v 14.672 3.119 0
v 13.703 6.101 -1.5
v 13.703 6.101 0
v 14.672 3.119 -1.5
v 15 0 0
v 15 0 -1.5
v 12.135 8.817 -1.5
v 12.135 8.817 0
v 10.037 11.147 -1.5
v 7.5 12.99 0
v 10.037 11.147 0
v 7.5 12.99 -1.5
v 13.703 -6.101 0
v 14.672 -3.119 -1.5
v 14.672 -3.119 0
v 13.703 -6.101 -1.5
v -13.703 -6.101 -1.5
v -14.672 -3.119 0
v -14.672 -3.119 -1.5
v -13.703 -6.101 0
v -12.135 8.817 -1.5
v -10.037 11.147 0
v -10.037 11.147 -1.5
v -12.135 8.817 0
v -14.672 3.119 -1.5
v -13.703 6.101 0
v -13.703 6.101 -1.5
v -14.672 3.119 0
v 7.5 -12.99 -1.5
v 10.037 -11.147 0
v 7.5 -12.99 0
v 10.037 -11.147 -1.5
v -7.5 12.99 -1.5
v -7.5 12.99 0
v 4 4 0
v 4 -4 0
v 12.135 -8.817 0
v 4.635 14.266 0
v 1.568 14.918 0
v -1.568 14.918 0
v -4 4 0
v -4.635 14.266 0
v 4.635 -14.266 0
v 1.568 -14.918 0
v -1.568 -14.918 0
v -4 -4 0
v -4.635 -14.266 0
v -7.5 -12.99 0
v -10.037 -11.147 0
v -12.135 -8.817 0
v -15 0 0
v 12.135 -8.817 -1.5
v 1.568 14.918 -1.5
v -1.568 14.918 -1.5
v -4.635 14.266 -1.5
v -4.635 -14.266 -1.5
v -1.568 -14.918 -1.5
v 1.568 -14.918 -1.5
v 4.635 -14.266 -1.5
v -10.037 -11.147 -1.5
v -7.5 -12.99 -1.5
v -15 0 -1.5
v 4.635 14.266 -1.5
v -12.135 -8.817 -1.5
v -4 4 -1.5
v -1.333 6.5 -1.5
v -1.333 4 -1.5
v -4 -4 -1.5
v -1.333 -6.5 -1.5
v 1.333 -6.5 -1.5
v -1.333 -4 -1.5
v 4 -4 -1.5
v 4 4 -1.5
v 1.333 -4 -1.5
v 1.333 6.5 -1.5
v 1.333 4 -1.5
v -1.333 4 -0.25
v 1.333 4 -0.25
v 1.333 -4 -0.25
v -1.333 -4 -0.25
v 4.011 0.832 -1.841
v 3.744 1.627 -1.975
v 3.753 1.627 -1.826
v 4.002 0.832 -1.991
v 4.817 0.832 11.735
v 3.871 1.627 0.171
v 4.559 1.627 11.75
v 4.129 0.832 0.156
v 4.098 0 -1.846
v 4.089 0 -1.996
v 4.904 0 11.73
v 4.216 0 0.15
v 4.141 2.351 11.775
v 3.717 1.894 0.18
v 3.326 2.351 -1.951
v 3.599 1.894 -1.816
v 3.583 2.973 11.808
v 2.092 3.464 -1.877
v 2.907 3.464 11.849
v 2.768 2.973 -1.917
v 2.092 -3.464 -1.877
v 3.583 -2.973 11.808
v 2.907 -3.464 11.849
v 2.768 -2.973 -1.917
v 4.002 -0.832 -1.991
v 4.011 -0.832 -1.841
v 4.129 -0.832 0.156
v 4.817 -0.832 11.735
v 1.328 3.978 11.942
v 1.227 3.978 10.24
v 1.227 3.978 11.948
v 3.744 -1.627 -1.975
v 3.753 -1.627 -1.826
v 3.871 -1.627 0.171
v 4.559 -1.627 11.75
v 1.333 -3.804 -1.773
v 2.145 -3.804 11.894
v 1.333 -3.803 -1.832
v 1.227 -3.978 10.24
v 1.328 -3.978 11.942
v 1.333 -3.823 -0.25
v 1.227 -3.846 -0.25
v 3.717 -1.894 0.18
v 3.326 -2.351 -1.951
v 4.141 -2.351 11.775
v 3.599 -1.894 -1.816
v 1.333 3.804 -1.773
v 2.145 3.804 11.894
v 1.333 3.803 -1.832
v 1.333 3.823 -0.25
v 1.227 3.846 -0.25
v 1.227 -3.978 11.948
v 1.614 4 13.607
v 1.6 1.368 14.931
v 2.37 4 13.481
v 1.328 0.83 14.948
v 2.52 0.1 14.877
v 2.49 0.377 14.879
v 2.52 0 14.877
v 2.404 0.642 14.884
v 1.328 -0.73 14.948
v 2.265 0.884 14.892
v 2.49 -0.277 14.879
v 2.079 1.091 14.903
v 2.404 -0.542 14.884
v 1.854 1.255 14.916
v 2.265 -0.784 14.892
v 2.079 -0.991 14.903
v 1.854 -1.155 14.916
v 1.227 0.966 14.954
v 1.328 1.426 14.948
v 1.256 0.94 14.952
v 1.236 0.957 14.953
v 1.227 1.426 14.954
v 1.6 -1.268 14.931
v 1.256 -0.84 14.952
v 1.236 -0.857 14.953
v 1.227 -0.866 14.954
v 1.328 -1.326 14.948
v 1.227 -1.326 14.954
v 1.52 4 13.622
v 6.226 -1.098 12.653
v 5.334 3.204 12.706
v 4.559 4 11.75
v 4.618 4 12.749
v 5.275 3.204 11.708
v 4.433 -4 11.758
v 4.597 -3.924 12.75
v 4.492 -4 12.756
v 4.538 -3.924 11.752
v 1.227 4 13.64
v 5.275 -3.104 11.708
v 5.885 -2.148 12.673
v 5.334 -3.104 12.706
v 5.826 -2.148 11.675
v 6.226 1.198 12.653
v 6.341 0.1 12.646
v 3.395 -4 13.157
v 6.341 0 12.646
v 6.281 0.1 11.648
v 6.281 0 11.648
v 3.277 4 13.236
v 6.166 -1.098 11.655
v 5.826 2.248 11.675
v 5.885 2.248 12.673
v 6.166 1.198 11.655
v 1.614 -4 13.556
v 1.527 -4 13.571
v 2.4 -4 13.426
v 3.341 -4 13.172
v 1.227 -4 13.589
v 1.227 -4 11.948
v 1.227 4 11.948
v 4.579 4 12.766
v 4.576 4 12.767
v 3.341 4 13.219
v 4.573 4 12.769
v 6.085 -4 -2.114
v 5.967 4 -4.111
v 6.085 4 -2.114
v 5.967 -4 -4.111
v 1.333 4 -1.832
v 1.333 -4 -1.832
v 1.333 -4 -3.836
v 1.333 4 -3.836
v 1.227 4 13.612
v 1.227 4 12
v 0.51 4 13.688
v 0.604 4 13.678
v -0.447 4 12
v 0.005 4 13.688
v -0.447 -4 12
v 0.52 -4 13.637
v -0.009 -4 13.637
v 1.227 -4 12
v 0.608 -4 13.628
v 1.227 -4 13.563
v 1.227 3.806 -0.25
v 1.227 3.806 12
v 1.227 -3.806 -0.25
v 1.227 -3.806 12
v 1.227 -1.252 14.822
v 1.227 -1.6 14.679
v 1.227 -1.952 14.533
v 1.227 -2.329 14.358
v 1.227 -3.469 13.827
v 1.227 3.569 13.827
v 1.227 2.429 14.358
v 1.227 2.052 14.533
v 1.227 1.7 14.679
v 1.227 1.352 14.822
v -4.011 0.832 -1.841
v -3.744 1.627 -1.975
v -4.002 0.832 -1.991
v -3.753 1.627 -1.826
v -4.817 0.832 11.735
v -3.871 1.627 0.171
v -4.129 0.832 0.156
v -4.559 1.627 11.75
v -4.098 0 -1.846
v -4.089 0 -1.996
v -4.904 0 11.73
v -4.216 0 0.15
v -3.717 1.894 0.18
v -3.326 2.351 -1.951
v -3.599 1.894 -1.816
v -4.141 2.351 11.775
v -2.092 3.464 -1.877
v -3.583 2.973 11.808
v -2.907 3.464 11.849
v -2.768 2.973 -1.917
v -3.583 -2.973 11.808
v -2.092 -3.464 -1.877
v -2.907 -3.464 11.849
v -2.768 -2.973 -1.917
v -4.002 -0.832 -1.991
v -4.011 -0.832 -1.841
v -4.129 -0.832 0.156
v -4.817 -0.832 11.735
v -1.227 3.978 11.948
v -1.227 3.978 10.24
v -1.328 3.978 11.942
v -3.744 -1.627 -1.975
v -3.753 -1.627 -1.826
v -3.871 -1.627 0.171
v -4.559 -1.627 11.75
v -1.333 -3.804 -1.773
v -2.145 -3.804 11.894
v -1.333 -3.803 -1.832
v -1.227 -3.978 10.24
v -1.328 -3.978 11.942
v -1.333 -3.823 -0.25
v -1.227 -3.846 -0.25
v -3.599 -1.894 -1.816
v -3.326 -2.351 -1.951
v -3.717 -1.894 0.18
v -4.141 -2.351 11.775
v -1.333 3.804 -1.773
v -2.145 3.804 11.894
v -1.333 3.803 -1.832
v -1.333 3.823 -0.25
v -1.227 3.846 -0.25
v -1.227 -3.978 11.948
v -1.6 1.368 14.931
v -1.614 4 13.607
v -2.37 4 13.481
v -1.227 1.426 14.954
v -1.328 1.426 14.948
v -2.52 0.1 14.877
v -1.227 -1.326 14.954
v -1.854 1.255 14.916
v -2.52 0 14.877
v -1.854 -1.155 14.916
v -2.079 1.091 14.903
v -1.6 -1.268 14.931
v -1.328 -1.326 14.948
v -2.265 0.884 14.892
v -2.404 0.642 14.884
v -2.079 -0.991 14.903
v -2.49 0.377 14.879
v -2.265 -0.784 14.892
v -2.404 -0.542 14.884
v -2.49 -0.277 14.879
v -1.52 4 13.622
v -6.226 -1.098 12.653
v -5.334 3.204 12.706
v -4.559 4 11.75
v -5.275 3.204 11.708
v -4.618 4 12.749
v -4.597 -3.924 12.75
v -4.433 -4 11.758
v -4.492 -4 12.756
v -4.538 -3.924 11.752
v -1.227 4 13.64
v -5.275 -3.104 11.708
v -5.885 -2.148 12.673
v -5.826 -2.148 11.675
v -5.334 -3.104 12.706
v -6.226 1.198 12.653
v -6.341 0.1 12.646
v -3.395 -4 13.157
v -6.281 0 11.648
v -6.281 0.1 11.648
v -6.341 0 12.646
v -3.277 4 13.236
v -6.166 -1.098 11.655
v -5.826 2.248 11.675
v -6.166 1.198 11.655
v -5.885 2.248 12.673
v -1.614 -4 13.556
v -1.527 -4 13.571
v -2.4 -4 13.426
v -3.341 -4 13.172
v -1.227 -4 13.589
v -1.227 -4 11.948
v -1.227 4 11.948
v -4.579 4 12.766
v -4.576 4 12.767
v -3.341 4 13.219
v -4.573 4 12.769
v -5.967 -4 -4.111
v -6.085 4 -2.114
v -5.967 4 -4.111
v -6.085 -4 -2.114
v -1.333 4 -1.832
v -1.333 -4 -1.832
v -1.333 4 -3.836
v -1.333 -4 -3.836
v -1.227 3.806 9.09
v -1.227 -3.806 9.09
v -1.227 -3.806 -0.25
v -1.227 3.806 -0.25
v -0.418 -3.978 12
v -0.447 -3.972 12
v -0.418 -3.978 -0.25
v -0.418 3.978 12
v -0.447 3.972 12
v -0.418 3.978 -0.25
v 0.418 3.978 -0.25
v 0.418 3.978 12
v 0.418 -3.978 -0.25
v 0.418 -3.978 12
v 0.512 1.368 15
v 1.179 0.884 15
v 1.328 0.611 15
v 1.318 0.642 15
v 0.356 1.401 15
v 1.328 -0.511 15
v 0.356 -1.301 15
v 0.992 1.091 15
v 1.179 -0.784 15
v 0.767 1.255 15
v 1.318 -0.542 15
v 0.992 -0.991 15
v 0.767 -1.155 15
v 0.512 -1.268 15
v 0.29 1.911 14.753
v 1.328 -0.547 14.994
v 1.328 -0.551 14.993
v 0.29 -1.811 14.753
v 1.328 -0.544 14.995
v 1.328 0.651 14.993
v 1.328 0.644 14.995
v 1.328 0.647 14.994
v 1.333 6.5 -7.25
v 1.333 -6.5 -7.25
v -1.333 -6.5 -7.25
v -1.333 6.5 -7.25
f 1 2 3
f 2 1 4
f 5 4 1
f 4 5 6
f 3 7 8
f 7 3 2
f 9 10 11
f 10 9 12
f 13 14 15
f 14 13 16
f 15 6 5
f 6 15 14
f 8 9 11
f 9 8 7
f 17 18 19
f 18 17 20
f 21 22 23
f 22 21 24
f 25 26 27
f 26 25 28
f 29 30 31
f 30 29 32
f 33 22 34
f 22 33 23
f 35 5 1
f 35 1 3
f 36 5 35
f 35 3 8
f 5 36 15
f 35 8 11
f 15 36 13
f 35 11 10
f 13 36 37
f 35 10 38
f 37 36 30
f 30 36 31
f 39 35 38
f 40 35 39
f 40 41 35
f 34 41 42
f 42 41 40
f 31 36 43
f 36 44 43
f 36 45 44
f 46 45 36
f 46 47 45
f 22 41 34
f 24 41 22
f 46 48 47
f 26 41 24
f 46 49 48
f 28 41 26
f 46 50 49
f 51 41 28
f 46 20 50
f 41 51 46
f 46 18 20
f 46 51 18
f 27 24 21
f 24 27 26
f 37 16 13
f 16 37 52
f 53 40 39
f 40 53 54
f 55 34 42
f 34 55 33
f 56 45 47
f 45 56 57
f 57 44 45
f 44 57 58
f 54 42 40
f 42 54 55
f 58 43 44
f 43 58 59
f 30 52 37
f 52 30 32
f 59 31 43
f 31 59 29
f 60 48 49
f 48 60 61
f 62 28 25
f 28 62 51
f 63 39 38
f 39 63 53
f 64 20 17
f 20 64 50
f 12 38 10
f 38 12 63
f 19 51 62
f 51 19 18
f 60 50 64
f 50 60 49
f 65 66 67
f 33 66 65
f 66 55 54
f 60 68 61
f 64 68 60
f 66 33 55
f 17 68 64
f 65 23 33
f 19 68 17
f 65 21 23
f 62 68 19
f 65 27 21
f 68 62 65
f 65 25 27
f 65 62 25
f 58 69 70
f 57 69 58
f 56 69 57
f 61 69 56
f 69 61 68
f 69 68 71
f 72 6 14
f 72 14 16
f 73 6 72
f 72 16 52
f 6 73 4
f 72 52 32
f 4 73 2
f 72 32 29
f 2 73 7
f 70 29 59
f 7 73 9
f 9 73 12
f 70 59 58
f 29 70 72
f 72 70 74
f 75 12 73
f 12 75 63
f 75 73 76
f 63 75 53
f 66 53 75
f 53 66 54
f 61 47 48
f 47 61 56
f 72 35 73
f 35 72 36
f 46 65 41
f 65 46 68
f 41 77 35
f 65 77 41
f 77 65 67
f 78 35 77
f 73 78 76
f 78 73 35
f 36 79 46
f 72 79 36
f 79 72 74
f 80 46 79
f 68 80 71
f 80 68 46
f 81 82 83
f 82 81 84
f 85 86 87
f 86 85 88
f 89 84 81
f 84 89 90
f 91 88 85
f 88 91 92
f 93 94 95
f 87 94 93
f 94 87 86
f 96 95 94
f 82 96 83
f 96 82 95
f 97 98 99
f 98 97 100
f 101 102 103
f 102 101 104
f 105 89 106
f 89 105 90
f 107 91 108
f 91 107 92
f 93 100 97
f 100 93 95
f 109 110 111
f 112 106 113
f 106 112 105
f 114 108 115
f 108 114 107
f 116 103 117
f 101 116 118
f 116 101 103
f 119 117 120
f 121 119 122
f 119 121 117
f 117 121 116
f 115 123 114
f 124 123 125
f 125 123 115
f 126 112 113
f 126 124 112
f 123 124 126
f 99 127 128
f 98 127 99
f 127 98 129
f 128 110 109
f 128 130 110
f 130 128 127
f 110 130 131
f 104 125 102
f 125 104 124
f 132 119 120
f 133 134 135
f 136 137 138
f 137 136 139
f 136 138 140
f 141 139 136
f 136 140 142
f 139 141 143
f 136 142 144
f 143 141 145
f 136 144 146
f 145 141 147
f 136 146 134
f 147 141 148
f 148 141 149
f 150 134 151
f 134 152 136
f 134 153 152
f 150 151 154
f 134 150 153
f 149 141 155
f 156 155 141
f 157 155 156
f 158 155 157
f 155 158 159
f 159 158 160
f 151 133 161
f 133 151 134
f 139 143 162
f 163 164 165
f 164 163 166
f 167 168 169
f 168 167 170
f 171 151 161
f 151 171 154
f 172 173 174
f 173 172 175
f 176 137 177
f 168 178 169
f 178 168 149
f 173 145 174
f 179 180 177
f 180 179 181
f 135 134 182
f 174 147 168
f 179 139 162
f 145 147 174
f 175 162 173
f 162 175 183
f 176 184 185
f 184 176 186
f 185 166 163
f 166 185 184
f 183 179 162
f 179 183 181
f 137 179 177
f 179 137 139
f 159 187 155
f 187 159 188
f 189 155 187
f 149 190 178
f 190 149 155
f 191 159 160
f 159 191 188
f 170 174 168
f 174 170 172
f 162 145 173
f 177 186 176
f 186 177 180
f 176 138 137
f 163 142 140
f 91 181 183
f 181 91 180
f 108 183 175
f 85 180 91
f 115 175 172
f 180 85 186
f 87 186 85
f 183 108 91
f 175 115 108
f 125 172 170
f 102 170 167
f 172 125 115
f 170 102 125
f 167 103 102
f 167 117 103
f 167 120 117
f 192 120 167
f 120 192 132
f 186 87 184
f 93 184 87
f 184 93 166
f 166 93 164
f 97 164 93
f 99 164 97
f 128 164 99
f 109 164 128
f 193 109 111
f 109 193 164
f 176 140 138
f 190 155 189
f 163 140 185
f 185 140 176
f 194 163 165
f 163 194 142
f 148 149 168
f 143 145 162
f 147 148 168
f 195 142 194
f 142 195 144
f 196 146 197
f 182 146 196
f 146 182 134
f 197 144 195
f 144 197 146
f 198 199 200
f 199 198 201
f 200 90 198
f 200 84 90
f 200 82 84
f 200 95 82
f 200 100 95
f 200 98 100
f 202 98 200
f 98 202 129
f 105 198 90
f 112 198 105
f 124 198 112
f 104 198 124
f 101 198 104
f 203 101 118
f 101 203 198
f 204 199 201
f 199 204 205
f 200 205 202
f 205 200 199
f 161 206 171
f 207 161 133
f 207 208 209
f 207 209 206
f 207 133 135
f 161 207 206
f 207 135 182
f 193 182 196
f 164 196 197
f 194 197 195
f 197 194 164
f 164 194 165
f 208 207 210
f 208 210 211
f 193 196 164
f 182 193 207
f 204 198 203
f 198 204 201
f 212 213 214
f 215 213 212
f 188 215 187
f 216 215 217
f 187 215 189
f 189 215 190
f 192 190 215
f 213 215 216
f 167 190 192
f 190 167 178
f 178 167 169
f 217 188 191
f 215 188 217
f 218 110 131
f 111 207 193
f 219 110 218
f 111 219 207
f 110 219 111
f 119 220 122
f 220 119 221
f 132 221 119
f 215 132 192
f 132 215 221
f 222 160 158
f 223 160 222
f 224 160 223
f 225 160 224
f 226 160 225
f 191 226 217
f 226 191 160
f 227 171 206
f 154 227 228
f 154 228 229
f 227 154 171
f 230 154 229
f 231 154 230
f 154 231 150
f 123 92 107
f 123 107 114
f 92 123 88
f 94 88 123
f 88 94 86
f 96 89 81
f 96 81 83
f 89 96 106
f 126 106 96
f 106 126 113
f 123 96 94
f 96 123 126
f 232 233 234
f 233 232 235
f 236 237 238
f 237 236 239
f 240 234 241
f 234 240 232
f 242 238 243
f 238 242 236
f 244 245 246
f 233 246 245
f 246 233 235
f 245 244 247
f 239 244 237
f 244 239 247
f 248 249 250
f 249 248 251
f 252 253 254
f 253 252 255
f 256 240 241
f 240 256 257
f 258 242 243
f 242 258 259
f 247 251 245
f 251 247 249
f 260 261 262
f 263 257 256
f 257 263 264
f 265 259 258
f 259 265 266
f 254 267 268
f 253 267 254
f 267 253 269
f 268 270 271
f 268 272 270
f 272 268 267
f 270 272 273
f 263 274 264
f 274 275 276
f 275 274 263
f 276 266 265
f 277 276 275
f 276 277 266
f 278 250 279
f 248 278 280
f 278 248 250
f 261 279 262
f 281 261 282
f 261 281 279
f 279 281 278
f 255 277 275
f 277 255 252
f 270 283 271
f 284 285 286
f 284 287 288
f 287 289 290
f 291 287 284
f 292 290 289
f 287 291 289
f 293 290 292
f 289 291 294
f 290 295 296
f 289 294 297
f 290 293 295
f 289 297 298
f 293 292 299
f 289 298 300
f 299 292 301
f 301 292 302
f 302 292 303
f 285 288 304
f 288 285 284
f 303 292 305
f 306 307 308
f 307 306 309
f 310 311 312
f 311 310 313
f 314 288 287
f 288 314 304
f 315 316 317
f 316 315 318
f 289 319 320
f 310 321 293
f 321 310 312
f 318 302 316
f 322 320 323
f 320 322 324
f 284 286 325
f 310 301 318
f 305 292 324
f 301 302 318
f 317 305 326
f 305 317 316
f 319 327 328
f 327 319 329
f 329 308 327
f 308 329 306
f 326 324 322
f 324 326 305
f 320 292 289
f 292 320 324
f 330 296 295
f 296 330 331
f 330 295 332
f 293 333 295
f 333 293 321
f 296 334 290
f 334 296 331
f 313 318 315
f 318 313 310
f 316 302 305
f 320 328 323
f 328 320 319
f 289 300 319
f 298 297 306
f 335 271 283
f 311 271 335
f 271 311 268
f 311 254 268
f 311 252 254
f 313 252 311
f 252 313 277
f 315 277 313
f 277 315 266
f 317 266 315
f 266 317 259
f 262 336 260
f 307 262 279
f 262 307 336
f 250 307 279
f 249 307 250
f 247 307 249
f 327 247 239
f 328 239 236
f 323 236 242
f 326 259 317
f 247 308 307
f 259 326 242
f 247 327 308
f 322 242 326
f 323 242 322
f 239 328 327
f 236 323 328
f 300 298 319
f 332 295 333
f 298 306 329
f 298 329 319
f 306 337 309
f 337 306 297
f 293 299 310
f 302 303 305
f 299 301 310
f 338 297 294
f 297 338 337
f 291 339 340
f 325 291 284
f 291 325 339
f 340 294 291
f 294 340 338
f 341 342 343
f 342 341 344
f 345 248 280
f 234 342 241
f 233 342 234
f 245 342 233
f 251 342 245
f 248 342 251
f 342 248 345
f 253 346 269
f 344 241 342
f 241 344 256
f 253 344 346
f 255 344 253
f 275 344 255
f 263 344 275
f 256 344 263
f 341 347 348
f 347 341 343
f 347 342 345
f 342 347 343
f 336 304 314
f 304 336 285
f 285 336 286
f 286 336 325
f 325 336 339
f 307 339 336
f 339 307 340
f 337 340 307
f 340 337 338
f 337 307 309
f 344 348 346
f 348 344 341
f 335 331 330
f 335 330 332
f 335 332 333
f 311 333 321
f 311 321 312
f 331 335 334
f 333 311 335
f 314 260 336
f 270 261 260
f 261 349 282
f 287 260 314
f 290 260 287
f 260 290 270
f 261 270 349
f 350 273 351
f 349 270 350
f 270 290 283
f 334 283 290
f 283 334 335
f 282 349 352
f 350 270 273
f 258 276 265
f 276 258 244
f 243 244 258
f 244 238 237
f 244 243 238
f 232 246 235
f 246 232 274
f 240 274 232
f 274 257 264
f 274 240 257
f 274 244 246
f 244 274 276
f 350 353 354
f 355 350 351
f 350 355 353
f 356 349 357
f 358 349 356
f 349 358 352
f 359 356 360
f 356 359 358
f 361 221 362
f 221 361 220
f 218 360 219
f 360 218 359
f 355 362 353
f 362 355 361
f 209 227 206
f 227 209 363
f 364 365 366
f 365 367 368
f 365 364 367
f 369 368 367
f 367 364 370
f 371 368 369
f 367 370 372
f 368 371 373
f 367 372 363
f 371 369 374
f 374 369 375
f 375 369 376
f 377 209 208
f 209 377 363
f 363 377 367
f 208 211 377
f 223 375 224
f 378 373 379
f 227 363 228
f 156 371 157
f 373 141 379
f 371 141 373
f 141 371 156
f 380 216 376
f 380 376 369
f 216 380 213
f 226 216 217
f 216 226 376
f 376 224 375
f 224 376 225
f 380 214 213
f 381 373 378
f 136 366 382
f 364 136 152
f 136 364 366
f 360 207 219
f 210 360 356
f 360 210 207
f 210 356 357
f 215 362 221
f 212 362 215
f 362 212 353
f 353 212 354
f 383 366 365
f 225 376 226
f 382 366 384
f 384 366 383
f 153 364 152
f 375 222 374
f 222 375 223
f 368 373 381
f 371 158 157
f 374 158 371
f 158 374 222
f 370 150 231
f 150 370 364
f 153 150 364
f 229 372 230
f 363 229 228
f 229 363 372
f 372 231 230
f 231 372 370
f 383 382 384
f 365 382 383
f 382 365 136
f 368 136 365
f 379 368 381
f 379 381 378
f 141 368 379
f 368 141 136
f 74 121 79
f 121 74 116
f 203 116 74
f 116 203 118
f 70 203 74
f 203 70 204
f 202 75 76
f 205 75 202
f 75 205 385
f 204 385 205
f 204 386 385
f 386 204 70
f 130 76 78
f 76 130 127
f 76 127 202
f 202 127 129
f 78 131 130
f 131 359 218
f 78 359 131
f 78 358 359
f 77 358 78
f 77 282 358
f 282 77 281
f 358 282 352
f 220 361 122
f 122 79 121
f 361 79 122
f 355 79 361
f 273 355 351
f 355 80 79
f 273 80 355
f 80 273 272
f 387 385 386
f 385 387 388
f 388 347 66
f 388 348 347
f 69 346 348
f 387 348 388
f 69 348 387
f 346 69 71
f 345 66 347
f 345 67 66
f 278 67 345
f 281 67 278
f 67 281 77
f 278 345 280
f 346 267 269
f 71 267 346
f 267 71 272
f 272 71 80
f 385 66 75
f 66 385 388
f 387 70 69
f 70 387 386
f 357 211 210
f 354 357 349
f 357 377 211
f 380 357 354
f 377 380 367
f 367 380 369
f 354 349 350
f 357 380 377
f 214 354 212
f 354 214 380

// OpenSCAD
/* [Panel_Retainer_Clip] */
//Diameter of center pin in mm
PinDiameterInMm = 8;// [6:15]
//Length of center pin in mm.
PinLengthInMm = 12;//[7:50]
//Diamenter of the large washer
WasherDiameterInMm = 30;//[20:50]
/* [Print_Layout] */
// 0 to render as assembled, 1 to render for printing
$PrintLayout = 0;//[0:Assembled,1:Printable]

/* [Hidden] */
$fs=.8;


if ($PrintLayout == 0)
    PanelRetainerClip(PinDiameterInMm,WasherDiameterInMm,PinLengthInMm, true);
else 
    PrintLayout(PinDiameterInMm,WasherDiameterInMm,PinLengthInMm);

module PrintLayout(shaftDiameter, topDiameter, depth){
    angle = atan(.95/(depth+4));
    translate([-topDiameter/2,(shaftDiameter-topDiameter)/2+2,1.5])
        TopWasher(shaftDiameter, topDiameter);
    translate([depth+3.5,-1,0.1])
        rotate([0,-90+angle,0])
            translate([-shaftDiameter/6,0,0])
                RightWing(shaftDiameter, depth);
    translate([-depth-4,shaftDiameter+3,0.1])
        rotate([0,90-angle,0])
            translate([shaftDiameter/6,0,0])
                LeftWing(shaftDiameter,depth);
    translate([8, shaftDiameter+3,0])
        rotate([0,90,0])
            translate([-shaftDiameter/6,0,0])
                Pin(shaftDiameter,depth);
}

module PanelRetainerClip(shaftDiameter=6, topDiameter=25, depth=15, open=false){
    angle = atan(.95/(depth+4));
    color("gray")
        TopWasher(shaftDiameter, topDiameter);
    color("darkgray")
    rotate([0,open?angle:0,0])
        RightWing(shaftDiameter, depth);
    color("steelblue")
    rotate([0,open?-angle:0,0])
        LeftWing(shaftDiameter, depth);
    color("navy")
    translate([0,0,open==true?0:-depth-4])
        Pin(shaftDiameter, depth);
}

module TopWasher(shaftDiameter, topDiameter){
    translate([0,0,-.75])
    difference(){
        cylinder(d=topDiameter, h = 1.5, center=true);
        cube([shaftDiameter, shaftDiameter, 2], center=true);
    }
}
module CenterSlot(shaftDiameter, depth){
    cube([shaftDiameter/3-.01,2*shaftDiameter, 4*depth], center = true);
}
module IdealPin(shaftDiameter, depth){
    intersection(){
        union(){
            translate([0,0,depth/2-.75])
                cylinder(d=shaftDiameter, h = depth+3, center=true);
            translate([0,0,depth])
                minkowski(){
                    cylinder(r1=shaftDiameter*.66, r2 = shaftDiameter/6, h=2);
                    cube([.1,.1,1]);
                }
                
            translate([0,0,-2.75])
                cube([shaftDiameter+4,shaftDiameter, 2], center=true);
        }
        cube([2*shaftDiameter, shaftDiameter, depth*3], center=true);
    }
}
module Half(shaftDiameter, depth){
    translate([-shaftDiameter, -shaftDiameter,-depth])
        cube([shaftDiameter, 2*shaftDiameter, 3*depth]);
}
module RightWing(shaftDiameter, depth){
    angle = atan(.95/(depth+4));
    translate([.2,0,0])
    difference(){
        IdealPin(shaftDiameter, depth);
        translate([.1,0,-depth/2-3])
            rotate([0,-angle,0])
                translate([0,0,depth/2])
                    scale([1.1,1,1]){
                        CenterSlot(shaftDiameter, depth);
                        Half(shaftDiameter, depth);
                    }
        translate([shaftDiameter/2,0,-.6])
            cube([1,shaftDiameter,2], center=true);
    }
}
module LeftWing(shaftDiameter, depth){
    mirror([1,0,0])
        RightWing(shaftDiameter, depth);
}
module Pin(shaftDiameter, depth){
    difference(){
        union(){
            intersection(){
                IdealPin(shaftDiameter, depth);
                CenterSlot(shaftDiameter, depth);
            }
            translate([0,0,-3.75])
                cube([shaftDiameter/3,shaftDiameter+5, 7], center=true);
        }
        translate([-2.25,0, depth+1])
            rotate([0,105,0])
                cube([shaftDiameter, shaftDiameter+2, 4], center=true);
    }
}
